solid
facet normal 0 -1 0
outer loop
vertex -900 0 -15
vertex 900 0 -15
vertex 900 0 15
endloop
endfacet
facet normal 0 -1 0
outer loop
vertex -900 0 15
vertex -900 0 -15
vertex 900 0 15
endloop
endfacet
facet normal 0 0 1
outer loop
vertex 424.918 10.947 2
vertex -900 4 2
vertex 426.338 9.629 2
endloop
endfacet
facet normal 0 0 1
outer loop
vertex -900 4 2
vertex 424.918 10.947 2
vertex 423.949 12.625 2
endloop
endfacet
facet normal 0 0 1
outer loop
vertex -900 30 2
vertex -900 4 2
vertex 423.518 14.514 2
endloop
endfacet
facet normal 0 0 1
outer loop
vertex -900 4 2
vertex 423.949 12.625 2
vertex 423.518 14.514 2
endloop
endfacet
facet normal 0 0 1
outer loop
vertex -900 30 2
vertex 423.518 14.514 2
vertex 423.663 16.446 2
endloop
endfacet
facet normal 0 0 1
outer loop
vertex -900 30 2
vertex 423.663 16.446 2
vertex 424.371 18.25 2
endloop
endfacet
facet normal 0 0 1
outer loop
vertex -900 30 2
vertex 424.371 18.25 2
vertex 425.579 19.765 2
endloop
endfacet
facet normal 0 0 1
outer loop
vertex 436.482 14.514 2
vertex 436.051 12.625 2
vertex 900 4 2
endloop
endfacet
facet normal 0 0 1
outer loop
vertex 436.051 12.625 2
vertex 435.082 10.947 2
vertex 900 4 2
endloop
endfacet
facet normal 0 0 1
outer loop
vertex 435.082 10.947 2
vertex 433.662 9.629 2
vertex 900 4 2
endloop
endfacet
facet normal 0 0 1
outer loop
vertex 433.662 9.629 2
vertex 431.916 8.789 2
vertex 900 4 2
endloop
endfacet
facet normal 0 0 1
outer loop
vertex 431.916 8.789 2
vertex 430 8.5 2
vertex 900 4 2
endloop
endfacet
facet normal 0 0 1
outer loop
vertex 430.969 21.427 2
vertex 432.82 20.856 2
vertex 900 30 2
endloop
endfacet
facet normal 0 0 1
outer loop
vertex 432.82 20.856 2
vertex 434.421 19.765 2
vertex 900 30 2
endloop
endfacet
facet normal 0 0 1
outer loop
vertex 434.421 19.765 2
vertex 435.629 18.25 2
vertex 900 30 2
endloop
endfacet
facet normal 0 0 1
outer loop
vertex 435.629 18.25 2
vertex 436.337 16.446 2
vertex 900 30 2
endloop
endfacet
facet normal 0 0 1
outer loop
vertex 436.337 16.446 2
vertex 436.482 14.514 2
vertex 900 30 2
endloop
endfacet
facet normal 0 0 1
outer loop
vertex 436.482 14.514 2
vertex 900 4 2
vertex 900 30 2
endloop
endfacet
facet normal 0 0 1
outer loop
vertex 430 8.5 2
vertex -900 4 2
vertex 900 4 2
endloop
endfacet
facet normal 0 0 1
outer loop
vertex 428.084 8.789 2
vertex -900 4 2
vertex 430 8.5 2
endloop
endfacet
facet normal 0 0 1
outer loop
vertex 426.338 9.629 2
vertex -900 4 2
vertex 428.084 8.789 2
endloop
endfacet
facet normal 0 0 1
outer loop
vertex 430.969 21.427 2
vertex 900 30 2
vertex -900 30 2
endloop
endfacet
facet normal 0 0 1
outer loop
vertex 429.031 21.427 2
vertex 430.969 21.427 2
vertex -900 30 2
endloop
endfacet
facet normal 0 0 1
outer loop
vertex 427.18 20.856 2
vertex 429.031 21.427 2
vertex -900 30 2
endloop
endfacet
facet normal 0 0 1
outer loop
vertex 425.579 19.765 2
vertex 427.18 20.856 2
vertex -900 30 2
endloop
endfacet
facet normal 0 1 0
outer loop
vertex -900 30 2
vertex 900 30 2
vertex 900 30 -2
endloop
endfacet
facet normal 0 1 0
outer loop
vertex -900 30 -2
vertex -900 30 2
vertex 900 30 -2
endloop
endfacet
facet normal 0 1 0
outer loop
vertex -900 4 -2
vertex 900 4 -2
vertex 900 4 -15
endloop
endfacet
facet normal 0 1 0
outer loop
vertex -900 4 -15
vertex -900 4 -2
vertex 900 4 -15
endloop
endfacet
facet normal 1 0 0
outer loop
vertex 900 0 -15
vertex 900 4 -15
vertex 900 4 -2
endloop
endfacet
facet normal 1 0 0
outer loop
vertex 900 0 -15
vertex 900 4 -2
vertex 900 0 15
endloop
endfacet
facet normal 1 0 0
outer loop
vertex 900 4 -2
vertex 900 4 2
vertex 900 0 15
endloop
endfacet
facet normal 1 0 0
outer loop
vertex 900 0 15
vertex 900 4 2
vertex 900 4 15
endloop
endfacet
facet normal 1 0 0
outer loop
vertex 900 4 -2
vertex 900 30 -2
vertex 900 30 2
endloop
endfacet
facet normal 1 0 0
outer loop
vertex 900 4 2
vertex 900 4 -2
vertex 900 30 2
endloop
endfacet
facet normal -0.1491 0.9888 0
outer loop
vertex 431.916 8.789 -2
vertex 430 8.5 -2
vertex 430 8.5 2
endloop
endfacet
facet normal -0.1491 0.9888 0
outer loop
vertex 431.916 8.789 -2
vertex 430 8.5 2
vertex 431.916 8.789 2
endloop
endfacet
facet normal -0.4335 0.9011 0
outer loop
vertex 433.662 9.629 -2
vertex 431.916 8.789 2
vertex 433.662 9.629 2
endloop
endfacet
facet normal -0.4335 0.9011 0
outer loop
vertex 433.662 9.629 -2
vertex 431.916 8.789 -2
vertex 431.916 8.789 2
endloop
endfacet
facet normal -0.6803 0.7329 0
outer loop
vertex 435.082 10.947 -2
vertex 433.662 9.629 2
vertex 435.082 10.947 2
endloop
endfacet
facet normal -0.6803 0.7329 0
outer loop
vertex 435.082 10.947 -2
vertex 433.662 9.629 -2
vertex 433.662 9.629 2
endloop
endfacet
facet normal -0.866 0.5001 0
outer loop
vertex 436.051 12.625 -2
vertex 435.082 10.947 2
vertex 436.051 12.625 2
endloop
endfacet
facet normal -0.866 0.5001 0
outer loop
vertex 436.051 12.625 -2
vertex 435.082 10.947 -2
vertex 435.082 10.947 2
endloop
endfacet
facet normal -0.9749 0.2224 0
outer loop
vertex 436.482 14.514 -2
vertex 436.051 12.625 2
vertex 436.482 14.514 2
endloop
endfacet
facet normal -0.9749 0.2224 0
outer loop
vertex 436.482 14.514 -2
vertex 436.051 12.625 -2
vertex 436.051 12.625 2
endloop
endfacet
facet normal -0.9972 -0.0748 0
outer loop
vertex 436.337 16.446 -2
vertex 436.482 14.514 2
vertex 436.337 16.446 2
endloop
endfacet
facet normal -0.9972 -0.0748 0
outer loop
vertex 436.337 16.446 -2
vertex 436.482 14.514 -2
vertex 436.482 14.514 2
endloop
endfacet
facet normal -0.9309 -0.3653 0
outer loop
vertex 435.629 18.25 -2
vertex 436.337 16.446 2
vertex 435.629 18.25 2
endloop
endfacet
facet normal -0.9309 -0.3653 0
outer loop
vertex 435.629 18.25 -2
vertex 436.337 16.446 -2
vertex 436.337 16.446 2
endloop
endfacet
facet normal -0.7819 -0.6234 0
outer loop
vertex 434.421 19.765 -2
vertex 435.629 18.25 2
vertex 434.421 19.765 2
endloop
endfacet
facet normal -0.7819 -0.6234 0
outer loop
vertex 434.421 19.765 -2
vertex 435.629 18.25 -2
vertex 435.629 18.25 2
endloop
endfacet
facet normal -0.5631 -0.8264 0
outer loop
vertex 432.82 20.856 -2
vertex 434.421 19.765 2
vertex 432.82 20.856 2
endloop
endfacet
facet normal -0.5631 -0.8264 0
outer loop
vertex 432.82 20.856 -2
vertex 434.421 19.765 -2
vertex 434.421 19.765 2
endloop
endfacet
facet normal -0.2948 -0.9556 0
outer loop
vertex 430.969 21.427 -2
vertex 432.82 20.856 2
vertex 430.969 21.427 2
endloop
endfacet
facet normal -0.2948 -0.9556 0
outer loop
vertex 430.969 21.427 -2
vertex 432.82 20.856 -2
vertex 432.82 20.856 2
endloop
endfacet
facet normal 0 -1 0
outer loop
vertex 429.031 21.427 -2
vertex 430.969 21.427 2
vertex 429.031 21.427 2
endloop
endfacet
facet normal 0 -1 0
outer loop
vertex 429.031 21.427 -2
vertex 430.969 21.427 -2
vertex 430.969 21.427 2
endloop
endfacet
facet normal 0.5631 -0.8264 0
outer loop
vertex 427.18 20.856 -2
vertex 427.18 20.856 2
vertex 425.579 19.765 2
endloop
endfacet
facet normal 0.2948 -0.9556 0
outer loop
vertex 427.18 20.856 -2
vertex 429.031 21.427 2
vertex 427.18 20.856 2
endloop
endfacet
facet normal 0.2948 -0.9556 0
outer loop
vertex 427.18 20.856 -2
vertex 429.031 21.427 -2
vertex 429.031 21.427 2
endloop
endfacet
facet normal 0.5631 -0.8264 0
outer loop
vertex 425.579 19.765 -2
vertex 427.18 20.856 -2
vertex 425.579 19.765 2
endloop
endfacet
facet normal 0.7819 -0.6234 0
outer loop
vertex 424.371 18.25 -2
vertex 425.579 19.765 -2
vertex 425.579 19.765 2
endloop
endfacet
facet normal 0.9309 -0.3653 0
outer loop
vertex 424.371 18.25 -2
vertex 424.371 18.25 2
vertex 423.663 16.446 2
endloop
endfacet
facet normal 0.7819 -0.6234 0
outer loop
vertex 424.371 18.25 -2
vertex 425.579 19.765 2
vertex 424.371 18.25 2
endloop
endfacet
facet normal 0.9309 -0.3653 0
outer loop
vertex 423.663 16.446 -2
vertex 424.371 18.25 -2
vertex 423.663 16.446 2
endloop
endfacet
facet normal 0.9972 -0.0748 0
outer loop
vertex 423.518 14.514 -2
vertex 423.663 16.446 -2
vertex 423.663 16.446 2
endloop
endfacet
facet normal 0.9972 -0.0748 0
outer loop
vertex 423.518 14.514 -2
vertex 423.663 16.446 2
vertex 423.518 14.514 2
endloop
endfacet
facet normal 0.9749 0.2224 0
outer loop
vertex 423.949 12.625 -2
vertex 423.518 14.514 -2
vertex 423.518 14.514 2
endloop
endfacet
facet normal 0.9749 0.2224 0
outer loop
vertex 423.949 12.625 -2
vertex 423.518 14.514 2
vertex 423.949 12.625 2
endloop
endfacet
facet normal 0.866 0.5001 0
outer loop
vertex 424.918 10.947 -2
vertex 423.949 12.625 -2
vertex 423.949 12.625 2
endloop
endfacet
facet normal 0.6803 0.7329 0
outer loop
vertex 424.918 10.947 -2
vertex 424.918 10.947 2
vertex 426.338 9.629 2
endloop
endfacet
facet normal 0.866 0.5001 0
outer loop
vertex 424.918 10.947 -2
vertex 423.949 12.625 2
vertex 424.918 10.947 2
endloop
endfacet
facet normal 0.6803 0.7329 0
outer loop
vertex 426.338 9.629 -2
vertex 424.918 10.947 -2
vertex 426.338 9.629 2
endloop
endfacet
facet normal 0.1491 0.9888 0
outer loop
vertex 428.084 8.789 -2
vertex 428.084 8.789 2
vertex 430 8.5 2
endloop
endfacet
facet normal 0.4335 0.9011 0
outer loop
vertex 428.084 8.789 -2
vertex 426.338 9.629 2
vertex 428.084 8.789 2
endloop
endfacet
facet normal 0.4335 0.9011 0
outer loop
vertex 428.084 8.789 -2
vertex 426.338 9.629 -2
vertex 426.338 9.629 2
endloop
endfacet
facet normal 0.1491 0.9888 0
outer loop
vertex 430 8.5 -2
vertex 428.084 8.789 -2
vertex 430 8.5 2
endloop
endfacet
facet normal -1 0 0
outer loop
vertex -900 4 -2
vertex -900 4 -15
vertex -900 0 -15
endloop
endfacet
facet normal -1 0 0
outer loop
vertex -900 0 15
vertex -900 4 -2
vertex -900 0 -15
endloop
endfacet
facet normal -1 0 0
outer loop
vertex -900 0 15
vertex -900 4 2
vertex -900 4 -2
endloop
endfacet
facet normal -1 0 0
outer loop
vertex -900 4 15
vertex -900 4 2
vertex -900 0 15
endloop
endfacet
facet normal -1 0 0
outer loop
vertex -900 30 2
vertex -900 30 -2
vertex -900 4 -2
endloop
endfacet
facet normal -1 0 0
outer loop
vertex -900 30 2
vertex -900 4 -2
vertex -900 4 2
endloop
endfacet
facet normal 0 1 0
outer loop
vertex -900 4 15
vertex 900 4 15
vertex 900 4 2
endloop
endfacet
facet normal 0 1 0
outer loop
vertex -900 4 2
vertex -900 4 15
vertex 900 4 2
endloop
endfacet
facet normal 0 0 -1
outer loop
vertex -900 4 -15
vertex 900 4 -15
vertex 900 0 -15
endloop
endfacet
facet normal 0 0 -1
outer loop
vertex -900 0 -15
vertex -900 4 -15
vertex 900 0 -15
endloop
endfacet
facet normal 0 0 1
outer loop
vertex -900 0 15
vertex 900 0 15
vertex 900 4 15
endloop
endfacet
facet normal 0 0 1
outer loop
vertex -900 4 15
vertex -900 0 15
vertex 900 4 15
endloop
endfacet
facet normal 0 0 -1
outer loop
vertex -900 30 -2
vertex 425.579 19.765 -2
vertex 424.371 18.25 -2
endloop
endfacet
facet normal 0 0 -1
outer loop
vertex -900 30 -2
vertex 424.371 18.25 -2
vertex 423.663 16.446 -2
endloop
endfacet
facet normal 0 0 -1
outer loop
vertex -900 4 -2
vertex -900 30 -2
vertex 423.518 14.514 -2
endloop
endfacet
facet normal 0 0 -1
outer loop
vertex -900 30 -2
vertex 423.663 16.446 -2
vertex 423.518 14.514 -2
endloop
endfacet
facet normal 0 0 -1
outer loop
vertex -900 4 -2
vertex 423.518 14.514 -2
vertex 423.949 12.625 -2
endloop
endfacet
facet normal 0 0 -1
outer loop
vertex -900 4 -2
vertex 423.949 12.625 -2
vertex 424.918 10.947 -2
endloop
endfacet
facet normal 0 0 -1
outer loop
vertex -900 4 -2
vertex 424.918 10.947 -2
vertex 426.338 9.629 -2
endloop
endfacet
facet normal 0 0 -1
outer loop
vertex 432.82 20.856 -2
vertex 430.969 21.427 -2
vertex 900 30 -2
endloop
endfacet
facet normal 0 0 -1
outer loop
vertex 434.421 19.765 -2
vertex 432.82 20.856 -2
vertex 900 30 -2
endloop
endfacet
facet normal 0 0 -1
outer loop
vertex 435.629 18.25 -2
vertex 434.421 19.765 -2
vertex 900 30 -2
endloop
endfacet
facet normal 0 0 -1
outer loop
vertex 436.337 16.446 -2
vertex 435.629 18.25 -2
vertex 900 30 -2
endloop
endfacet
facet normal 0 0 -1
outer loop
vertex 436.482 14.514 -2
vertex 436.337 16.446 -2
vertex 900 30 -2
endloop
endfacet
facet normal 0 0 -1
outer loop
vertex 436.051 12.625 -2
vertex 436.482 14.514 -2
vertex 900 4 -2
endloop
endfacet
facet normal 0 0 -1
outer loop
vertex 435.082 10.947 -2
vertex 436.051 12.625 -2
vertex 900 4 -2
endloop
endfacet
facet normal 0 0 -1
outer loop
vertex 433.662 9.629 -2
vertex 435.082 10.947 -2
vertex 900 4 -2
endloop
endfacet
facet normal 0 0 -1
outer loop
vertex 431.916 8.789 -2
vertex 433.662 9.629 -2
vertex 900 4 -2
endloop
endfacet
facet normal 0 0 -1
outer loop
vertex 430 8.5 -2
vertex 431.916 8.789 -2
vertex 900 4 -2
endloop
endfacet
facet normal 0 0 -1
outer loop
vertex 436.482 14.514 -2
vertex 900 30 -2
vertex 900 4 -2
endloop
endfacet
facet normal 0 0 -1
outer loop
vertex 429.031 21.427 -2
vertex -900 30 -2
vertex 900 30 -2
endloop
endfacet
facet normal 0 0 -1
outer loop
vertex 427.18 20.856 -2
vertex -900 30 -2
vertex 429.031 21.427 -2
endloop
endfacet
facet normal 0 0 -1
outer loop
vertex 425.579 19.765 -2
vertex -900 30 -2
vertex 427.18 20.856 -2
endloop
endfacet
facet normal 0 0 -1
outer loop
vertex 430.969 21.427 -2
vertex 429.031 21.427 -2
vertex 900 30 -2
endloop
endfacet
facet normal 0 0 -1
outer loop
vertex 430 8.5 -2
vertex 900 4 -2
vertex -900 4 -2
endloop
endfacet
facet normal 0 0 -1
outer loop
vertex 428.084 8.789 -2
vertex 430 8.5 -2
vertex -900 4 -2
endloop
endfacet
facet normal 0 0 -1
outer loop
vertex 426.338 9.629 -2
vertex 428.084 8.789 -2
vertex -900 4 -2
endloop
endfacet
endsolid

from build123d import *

# Parameters (mm, degrees)
CUSTOM_TE_30X30X4_1_DEPTH    = 1800
ENL_V_MAT_EXTRU_4_DEPTH      = 1332.925298206
ENL_V_MAT_EXTRU_4_DEPTH_BACK = 1332.925298206
ESQUISSE15_R                 = 6.5


with BuildPart() as part:
    # Esquisse11 → Custom TE_30X30X4(1) (new body)
    with BuildSketch(Plane.ZY.offset(-900)):
        Polygon((-15, 0), (15, 0), (15, 4), (2, 4), (2, 30), (-2, 30), (-2, 4), (-15, 4), align=None)
    extrude(amount=CUSTOM_TE_30X30X4_1_DEPTH)

    # Esquisse15 → Enlèv. mat.-Extru.4 (cut, two sides: drawn at the far end of the back side and taken through both)
    with BuildSketch(Plane(origin=(430, 0, 50), x_dir=(1, 0, 0), z_dir=(0, 0, 1)).offset(-ENL_V_MAT_EXTRU_4_DEPTH_BACK)):
        with Locations(Location((0, 15, 0), (0, 0, 270))):
            Circle(ESQUISSE15_R)
    extrude(amount=ENL_V_MAT_EXTRU_4_DEPTH + ENL_V_MAT_EXTRU_4_DEPTH_BACK, mode=Mode.SUBTRACT)


solid = part.part
